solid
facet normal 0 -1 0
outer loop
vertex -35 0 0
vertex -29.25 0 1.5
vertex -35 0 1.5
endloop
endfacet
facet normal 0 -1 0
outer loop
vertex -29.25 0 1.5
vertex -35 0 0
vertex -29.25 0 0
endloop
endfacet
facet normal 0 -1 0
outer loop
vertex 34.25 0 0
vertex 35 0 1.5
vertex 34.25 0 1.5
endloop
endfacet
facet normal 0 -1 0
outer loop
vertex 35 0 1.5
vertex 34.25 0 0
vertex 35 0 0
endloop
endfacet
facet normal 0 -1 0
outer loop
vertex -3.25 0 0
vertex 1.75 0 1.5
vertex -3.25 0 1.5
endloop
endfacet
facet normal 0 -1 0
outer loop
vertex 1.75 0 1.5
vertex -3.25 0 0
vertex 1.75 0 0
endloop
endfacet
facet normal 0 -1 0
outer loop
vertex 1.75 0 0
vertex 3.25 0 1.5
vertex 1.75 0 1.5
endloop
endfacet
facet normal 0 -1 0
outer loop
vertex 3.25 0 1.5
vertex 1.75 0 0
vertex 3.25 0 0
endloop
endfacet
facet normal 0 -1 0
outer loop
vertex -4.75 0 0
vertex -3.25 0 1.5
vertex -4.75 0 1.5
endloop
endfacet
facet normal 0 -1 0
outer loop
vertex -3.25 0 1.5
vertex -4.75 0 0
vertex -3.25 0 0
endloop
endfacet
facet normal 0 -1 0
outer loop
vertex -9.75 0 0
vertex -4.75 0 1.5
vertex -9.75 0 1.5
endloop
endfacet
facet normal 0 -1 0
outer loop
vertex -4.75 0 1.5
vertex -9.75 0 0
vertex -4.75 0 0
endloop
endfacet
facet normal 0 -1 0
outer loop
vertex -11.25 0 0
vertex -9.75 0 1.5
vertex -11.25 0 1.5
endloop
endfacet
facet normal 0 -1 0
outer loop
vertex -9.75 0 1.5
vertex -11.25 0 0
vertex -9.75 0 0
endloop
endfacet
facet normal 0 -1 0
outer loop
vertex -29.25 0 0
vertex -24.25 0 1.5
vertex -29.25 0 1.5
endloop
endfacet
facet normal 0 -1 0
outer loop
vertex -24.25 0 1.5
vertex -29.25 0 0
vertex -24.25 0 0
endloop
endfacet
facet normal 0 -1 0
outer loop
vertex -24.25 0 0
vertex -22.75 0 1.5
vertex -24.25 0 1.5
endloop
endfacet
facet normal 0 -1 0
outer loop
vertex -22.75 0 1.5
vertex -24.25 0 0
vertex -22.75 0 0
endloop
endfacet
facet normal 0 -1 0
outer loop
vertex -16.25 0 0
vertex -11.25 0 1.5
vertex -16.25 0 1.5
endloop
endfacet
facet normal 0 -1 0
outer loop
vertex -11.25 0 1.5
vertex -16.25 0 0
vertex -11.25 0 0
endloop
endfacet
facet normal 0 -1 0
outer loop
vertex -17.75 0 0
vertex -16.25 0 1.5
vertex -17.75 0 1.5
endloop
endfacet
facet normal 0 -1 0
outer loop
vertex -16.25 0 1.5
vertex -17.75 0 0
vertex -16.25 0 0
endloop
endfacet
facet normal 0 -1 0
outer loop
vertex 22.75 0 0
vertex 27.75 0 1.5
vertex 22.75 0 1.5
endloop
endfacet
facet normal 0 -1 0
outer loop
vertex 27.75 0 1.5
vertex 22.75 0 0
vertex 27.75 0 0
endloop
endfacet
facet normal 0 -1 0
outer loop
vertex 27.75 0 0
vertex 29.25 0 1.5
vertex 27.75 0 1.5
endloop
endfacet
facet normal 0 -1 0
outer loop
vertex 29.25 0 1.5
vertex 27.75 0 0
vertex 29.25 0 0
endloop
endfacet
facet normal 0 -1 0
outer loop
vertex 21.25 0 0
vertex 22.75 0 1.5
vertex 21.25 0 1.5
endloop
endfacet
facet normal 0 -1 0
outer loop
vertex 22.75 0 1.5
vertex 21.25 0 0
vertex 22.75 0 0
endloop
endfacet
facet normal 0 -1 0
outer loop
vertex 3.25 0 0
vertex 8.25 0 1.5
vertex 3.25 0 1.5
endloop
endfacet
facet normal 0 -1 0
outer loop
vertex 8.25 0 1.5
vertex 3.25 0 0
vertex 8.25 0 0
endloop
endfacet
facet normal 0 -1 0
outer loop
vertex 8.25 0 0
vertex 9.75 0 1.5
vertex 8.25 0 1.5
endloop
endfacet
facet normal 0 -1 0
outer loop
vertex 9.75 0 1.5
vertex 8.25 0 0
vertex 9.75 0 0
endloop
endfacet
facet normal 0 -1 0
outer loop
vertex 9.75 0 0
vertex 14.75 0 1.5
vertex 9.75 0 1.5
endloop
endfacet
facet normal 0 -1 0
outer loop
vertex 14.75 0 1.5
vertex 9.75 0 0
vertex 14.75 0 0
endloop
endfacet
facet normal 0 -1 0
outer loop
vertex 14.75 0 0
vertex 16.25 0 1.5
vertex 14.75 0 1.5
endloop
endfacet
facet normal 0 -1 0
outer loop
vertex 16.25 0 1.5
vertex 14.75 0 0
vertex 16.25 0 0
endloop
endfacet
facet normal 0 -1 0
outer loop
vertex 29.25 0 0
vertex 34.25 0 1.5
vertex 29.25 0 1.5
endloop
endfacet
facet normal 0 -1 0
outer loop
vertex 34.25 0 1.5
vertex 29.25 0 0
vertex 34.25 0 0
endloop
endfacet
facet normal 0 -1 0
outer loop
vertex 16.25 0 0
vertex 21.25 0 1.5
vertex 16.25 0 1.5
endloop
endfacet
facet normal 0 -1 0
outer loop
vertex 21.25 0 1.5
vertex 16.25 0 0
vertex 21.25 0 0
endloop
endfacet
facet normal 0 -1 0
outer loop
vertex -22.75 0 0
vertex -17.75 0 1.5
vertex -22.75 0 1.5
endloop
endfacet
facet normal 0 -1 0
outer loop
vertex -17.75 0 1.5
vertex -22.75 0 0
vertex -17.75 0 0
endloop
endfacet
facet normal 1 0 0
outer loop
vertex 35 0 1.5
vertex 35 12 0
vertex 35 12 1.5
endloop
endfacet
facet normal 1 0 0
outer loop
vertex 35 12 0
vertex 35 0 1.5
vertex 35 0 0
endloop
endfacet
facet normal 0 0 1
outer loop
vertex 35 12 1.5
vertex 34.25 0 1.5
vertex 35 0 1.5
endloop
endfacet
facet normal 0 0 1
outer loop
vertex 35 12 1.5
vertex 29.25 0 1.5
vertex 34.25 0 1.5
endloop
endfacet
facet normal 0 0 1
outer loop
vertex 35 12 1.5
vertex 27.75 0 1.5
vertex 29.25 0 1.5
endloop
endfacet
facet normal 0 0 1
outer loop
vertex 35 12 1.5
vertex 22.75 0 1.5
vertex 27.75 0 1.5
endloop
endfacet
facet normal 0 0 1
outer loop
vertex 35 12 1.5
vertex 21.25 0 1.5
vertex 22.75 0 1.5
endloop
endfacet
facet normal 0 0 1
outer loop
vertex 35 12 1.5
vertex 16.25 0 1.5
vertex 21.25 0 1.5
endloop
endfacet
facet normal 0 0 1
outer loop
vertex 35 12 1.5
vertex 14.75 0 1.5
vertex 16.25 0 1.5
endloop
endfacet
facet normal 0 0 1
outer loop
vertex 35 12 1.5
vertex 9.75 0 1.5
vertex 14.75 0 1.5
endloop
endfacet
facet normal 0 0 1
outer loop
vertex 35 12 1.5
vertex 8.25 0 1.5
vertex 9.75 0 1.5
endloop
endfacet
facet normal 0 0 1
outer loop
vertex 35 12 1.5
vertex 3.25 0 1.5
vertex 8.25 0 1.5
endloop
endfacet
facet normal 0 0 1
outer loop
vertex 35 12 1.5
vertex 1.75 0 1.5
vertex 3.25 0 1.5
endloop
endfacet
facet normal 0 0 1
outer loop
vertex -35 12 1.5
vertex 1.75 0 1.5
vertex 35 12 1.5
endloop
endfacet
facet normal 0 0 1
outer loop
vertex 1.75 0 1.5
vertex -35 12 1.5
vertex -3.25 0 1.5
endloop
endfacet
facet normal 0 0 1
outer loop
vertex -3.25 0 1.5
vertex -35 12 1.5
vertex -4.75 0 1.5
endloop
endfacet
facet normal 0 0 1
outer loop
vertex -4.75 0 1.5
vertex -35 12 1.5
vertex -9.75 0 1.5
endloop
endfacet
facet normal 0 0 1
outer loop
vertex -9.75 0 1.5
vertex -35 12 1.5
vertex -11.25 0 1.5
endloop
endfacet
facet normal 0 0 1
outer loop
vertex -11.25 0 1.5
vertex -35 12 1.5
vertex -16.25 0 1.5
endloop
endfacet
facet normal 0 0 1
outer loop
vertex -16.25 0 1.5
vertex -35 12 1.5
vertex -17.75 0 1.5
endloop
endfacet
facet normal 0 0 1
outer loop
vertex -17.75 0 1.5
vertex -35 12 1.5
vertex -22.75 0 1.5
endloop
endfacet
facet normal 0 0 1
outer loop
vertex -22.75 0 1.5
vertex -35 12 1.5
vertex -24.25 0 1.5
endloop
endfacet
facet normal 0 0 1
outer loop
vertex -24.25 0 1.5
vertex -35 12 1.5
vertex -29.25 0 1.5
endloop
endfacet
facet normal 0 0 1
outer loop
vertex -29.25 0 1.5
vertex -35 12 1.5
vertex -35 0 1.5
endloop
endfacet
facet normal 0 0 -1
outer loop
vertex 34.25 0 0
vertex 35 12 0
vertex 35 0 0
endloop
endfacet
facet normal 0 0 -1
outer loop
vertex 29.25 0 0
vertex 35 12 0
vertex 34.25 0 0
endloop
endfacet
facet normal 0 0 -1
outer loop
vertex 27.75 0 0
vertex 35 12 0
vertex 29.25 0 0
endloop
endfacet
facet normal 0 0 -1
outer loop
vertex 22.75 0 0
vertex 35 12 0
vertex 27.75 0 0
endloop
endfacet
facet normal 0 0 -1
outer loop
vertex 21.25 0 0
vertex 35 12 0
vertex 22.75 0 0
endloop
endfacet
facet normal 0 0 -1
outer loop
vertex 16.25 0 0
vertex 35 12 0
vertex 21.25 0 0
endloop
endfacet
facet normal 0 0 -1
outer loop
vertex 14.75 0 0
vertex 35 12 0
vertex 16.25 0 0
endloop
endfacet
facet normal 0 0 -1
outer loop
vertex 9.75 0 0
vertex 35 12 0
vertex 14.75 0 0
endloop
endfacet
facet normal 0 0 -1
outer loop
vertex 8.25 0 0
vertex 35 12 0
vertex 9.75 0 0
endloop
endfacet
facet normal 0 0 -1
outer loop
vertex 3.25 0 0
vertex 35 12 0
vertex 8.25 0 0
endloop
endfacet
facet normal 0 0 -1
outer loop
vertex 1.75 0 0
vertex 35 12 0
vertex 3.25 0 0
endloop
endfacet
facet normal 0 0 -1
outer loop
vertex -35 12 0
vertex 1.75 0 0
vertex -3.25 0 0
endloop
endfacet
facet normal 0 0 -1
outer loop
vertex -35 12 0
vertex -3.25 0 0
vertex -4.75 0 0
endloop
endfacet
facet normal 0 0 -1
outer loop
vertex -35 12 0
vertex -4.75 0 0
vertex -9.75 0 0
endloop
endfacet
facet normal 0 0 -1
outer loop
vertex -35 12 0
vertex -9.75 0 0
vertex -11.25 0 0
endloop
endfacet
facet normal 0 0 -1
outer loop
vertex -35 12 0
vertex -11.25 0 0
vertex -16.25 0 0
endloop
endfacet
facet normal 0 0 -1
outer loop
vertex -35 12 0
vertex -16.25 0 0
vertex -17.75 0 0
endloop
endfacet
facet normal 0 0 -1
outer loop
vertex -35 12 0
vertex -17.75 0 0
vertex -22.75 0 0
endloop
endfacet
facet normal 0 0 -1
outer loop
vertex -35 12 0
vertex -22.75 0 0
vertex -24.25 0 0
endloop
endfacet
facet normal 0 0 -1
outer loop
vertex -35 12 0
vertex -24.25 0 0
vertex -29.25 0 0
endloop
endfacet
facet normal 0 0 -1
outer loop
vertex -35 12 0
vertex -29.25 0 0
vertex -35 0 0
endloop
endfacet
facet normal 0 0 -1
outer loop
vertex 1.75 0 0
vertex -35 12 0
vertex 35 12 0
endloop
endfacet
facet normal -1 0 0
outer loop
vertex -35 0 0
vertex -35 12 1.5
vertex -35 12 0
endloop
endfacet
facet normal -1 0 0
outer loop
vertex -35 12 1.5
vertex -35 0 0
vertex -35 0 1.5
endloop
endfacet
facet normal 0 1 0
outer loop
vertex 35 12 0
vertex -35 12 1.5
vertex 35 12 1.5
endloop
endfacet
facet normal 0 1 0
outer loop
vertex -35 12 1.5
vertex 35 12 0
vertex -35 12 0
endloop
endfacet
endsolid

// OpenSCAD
// 10-well agarose gel comb - printed lying flat
// Units: mm

plate_t      = 1.5;   // plate thickness (Z)
spine_len    = 70;    // spine length (X)
spine_w      = 12;    // spine width (Y)
tooth_count  = 10;    // number of teeth
tooth_w      = 5.0;   // tooth width (X)
tooth_len    = 12;    // tooth length (Y)
tooth_gap    = 1.5;   // gap between teeth (X)
eps          = 0.5;   // cutter overshoot

$fn = 64;

pitch = tooth_w + tooth_gap;  // 6.5 mm
x0    = -(tooth_count - 1) * pitch / 2;  // first tooth left edge

difference() {
    // Spine
    translate([-spine_len / 2, 0, 0])
        cube([spine_len, spine_w, plate_t]);

    // Teeth
    for (i = [0 : tooth_count - 1])
        translate([x0 + i * pitch, -tooth_len, 0])
            cube([tooth_w, tooth_len, plate_t + eps]);
}
